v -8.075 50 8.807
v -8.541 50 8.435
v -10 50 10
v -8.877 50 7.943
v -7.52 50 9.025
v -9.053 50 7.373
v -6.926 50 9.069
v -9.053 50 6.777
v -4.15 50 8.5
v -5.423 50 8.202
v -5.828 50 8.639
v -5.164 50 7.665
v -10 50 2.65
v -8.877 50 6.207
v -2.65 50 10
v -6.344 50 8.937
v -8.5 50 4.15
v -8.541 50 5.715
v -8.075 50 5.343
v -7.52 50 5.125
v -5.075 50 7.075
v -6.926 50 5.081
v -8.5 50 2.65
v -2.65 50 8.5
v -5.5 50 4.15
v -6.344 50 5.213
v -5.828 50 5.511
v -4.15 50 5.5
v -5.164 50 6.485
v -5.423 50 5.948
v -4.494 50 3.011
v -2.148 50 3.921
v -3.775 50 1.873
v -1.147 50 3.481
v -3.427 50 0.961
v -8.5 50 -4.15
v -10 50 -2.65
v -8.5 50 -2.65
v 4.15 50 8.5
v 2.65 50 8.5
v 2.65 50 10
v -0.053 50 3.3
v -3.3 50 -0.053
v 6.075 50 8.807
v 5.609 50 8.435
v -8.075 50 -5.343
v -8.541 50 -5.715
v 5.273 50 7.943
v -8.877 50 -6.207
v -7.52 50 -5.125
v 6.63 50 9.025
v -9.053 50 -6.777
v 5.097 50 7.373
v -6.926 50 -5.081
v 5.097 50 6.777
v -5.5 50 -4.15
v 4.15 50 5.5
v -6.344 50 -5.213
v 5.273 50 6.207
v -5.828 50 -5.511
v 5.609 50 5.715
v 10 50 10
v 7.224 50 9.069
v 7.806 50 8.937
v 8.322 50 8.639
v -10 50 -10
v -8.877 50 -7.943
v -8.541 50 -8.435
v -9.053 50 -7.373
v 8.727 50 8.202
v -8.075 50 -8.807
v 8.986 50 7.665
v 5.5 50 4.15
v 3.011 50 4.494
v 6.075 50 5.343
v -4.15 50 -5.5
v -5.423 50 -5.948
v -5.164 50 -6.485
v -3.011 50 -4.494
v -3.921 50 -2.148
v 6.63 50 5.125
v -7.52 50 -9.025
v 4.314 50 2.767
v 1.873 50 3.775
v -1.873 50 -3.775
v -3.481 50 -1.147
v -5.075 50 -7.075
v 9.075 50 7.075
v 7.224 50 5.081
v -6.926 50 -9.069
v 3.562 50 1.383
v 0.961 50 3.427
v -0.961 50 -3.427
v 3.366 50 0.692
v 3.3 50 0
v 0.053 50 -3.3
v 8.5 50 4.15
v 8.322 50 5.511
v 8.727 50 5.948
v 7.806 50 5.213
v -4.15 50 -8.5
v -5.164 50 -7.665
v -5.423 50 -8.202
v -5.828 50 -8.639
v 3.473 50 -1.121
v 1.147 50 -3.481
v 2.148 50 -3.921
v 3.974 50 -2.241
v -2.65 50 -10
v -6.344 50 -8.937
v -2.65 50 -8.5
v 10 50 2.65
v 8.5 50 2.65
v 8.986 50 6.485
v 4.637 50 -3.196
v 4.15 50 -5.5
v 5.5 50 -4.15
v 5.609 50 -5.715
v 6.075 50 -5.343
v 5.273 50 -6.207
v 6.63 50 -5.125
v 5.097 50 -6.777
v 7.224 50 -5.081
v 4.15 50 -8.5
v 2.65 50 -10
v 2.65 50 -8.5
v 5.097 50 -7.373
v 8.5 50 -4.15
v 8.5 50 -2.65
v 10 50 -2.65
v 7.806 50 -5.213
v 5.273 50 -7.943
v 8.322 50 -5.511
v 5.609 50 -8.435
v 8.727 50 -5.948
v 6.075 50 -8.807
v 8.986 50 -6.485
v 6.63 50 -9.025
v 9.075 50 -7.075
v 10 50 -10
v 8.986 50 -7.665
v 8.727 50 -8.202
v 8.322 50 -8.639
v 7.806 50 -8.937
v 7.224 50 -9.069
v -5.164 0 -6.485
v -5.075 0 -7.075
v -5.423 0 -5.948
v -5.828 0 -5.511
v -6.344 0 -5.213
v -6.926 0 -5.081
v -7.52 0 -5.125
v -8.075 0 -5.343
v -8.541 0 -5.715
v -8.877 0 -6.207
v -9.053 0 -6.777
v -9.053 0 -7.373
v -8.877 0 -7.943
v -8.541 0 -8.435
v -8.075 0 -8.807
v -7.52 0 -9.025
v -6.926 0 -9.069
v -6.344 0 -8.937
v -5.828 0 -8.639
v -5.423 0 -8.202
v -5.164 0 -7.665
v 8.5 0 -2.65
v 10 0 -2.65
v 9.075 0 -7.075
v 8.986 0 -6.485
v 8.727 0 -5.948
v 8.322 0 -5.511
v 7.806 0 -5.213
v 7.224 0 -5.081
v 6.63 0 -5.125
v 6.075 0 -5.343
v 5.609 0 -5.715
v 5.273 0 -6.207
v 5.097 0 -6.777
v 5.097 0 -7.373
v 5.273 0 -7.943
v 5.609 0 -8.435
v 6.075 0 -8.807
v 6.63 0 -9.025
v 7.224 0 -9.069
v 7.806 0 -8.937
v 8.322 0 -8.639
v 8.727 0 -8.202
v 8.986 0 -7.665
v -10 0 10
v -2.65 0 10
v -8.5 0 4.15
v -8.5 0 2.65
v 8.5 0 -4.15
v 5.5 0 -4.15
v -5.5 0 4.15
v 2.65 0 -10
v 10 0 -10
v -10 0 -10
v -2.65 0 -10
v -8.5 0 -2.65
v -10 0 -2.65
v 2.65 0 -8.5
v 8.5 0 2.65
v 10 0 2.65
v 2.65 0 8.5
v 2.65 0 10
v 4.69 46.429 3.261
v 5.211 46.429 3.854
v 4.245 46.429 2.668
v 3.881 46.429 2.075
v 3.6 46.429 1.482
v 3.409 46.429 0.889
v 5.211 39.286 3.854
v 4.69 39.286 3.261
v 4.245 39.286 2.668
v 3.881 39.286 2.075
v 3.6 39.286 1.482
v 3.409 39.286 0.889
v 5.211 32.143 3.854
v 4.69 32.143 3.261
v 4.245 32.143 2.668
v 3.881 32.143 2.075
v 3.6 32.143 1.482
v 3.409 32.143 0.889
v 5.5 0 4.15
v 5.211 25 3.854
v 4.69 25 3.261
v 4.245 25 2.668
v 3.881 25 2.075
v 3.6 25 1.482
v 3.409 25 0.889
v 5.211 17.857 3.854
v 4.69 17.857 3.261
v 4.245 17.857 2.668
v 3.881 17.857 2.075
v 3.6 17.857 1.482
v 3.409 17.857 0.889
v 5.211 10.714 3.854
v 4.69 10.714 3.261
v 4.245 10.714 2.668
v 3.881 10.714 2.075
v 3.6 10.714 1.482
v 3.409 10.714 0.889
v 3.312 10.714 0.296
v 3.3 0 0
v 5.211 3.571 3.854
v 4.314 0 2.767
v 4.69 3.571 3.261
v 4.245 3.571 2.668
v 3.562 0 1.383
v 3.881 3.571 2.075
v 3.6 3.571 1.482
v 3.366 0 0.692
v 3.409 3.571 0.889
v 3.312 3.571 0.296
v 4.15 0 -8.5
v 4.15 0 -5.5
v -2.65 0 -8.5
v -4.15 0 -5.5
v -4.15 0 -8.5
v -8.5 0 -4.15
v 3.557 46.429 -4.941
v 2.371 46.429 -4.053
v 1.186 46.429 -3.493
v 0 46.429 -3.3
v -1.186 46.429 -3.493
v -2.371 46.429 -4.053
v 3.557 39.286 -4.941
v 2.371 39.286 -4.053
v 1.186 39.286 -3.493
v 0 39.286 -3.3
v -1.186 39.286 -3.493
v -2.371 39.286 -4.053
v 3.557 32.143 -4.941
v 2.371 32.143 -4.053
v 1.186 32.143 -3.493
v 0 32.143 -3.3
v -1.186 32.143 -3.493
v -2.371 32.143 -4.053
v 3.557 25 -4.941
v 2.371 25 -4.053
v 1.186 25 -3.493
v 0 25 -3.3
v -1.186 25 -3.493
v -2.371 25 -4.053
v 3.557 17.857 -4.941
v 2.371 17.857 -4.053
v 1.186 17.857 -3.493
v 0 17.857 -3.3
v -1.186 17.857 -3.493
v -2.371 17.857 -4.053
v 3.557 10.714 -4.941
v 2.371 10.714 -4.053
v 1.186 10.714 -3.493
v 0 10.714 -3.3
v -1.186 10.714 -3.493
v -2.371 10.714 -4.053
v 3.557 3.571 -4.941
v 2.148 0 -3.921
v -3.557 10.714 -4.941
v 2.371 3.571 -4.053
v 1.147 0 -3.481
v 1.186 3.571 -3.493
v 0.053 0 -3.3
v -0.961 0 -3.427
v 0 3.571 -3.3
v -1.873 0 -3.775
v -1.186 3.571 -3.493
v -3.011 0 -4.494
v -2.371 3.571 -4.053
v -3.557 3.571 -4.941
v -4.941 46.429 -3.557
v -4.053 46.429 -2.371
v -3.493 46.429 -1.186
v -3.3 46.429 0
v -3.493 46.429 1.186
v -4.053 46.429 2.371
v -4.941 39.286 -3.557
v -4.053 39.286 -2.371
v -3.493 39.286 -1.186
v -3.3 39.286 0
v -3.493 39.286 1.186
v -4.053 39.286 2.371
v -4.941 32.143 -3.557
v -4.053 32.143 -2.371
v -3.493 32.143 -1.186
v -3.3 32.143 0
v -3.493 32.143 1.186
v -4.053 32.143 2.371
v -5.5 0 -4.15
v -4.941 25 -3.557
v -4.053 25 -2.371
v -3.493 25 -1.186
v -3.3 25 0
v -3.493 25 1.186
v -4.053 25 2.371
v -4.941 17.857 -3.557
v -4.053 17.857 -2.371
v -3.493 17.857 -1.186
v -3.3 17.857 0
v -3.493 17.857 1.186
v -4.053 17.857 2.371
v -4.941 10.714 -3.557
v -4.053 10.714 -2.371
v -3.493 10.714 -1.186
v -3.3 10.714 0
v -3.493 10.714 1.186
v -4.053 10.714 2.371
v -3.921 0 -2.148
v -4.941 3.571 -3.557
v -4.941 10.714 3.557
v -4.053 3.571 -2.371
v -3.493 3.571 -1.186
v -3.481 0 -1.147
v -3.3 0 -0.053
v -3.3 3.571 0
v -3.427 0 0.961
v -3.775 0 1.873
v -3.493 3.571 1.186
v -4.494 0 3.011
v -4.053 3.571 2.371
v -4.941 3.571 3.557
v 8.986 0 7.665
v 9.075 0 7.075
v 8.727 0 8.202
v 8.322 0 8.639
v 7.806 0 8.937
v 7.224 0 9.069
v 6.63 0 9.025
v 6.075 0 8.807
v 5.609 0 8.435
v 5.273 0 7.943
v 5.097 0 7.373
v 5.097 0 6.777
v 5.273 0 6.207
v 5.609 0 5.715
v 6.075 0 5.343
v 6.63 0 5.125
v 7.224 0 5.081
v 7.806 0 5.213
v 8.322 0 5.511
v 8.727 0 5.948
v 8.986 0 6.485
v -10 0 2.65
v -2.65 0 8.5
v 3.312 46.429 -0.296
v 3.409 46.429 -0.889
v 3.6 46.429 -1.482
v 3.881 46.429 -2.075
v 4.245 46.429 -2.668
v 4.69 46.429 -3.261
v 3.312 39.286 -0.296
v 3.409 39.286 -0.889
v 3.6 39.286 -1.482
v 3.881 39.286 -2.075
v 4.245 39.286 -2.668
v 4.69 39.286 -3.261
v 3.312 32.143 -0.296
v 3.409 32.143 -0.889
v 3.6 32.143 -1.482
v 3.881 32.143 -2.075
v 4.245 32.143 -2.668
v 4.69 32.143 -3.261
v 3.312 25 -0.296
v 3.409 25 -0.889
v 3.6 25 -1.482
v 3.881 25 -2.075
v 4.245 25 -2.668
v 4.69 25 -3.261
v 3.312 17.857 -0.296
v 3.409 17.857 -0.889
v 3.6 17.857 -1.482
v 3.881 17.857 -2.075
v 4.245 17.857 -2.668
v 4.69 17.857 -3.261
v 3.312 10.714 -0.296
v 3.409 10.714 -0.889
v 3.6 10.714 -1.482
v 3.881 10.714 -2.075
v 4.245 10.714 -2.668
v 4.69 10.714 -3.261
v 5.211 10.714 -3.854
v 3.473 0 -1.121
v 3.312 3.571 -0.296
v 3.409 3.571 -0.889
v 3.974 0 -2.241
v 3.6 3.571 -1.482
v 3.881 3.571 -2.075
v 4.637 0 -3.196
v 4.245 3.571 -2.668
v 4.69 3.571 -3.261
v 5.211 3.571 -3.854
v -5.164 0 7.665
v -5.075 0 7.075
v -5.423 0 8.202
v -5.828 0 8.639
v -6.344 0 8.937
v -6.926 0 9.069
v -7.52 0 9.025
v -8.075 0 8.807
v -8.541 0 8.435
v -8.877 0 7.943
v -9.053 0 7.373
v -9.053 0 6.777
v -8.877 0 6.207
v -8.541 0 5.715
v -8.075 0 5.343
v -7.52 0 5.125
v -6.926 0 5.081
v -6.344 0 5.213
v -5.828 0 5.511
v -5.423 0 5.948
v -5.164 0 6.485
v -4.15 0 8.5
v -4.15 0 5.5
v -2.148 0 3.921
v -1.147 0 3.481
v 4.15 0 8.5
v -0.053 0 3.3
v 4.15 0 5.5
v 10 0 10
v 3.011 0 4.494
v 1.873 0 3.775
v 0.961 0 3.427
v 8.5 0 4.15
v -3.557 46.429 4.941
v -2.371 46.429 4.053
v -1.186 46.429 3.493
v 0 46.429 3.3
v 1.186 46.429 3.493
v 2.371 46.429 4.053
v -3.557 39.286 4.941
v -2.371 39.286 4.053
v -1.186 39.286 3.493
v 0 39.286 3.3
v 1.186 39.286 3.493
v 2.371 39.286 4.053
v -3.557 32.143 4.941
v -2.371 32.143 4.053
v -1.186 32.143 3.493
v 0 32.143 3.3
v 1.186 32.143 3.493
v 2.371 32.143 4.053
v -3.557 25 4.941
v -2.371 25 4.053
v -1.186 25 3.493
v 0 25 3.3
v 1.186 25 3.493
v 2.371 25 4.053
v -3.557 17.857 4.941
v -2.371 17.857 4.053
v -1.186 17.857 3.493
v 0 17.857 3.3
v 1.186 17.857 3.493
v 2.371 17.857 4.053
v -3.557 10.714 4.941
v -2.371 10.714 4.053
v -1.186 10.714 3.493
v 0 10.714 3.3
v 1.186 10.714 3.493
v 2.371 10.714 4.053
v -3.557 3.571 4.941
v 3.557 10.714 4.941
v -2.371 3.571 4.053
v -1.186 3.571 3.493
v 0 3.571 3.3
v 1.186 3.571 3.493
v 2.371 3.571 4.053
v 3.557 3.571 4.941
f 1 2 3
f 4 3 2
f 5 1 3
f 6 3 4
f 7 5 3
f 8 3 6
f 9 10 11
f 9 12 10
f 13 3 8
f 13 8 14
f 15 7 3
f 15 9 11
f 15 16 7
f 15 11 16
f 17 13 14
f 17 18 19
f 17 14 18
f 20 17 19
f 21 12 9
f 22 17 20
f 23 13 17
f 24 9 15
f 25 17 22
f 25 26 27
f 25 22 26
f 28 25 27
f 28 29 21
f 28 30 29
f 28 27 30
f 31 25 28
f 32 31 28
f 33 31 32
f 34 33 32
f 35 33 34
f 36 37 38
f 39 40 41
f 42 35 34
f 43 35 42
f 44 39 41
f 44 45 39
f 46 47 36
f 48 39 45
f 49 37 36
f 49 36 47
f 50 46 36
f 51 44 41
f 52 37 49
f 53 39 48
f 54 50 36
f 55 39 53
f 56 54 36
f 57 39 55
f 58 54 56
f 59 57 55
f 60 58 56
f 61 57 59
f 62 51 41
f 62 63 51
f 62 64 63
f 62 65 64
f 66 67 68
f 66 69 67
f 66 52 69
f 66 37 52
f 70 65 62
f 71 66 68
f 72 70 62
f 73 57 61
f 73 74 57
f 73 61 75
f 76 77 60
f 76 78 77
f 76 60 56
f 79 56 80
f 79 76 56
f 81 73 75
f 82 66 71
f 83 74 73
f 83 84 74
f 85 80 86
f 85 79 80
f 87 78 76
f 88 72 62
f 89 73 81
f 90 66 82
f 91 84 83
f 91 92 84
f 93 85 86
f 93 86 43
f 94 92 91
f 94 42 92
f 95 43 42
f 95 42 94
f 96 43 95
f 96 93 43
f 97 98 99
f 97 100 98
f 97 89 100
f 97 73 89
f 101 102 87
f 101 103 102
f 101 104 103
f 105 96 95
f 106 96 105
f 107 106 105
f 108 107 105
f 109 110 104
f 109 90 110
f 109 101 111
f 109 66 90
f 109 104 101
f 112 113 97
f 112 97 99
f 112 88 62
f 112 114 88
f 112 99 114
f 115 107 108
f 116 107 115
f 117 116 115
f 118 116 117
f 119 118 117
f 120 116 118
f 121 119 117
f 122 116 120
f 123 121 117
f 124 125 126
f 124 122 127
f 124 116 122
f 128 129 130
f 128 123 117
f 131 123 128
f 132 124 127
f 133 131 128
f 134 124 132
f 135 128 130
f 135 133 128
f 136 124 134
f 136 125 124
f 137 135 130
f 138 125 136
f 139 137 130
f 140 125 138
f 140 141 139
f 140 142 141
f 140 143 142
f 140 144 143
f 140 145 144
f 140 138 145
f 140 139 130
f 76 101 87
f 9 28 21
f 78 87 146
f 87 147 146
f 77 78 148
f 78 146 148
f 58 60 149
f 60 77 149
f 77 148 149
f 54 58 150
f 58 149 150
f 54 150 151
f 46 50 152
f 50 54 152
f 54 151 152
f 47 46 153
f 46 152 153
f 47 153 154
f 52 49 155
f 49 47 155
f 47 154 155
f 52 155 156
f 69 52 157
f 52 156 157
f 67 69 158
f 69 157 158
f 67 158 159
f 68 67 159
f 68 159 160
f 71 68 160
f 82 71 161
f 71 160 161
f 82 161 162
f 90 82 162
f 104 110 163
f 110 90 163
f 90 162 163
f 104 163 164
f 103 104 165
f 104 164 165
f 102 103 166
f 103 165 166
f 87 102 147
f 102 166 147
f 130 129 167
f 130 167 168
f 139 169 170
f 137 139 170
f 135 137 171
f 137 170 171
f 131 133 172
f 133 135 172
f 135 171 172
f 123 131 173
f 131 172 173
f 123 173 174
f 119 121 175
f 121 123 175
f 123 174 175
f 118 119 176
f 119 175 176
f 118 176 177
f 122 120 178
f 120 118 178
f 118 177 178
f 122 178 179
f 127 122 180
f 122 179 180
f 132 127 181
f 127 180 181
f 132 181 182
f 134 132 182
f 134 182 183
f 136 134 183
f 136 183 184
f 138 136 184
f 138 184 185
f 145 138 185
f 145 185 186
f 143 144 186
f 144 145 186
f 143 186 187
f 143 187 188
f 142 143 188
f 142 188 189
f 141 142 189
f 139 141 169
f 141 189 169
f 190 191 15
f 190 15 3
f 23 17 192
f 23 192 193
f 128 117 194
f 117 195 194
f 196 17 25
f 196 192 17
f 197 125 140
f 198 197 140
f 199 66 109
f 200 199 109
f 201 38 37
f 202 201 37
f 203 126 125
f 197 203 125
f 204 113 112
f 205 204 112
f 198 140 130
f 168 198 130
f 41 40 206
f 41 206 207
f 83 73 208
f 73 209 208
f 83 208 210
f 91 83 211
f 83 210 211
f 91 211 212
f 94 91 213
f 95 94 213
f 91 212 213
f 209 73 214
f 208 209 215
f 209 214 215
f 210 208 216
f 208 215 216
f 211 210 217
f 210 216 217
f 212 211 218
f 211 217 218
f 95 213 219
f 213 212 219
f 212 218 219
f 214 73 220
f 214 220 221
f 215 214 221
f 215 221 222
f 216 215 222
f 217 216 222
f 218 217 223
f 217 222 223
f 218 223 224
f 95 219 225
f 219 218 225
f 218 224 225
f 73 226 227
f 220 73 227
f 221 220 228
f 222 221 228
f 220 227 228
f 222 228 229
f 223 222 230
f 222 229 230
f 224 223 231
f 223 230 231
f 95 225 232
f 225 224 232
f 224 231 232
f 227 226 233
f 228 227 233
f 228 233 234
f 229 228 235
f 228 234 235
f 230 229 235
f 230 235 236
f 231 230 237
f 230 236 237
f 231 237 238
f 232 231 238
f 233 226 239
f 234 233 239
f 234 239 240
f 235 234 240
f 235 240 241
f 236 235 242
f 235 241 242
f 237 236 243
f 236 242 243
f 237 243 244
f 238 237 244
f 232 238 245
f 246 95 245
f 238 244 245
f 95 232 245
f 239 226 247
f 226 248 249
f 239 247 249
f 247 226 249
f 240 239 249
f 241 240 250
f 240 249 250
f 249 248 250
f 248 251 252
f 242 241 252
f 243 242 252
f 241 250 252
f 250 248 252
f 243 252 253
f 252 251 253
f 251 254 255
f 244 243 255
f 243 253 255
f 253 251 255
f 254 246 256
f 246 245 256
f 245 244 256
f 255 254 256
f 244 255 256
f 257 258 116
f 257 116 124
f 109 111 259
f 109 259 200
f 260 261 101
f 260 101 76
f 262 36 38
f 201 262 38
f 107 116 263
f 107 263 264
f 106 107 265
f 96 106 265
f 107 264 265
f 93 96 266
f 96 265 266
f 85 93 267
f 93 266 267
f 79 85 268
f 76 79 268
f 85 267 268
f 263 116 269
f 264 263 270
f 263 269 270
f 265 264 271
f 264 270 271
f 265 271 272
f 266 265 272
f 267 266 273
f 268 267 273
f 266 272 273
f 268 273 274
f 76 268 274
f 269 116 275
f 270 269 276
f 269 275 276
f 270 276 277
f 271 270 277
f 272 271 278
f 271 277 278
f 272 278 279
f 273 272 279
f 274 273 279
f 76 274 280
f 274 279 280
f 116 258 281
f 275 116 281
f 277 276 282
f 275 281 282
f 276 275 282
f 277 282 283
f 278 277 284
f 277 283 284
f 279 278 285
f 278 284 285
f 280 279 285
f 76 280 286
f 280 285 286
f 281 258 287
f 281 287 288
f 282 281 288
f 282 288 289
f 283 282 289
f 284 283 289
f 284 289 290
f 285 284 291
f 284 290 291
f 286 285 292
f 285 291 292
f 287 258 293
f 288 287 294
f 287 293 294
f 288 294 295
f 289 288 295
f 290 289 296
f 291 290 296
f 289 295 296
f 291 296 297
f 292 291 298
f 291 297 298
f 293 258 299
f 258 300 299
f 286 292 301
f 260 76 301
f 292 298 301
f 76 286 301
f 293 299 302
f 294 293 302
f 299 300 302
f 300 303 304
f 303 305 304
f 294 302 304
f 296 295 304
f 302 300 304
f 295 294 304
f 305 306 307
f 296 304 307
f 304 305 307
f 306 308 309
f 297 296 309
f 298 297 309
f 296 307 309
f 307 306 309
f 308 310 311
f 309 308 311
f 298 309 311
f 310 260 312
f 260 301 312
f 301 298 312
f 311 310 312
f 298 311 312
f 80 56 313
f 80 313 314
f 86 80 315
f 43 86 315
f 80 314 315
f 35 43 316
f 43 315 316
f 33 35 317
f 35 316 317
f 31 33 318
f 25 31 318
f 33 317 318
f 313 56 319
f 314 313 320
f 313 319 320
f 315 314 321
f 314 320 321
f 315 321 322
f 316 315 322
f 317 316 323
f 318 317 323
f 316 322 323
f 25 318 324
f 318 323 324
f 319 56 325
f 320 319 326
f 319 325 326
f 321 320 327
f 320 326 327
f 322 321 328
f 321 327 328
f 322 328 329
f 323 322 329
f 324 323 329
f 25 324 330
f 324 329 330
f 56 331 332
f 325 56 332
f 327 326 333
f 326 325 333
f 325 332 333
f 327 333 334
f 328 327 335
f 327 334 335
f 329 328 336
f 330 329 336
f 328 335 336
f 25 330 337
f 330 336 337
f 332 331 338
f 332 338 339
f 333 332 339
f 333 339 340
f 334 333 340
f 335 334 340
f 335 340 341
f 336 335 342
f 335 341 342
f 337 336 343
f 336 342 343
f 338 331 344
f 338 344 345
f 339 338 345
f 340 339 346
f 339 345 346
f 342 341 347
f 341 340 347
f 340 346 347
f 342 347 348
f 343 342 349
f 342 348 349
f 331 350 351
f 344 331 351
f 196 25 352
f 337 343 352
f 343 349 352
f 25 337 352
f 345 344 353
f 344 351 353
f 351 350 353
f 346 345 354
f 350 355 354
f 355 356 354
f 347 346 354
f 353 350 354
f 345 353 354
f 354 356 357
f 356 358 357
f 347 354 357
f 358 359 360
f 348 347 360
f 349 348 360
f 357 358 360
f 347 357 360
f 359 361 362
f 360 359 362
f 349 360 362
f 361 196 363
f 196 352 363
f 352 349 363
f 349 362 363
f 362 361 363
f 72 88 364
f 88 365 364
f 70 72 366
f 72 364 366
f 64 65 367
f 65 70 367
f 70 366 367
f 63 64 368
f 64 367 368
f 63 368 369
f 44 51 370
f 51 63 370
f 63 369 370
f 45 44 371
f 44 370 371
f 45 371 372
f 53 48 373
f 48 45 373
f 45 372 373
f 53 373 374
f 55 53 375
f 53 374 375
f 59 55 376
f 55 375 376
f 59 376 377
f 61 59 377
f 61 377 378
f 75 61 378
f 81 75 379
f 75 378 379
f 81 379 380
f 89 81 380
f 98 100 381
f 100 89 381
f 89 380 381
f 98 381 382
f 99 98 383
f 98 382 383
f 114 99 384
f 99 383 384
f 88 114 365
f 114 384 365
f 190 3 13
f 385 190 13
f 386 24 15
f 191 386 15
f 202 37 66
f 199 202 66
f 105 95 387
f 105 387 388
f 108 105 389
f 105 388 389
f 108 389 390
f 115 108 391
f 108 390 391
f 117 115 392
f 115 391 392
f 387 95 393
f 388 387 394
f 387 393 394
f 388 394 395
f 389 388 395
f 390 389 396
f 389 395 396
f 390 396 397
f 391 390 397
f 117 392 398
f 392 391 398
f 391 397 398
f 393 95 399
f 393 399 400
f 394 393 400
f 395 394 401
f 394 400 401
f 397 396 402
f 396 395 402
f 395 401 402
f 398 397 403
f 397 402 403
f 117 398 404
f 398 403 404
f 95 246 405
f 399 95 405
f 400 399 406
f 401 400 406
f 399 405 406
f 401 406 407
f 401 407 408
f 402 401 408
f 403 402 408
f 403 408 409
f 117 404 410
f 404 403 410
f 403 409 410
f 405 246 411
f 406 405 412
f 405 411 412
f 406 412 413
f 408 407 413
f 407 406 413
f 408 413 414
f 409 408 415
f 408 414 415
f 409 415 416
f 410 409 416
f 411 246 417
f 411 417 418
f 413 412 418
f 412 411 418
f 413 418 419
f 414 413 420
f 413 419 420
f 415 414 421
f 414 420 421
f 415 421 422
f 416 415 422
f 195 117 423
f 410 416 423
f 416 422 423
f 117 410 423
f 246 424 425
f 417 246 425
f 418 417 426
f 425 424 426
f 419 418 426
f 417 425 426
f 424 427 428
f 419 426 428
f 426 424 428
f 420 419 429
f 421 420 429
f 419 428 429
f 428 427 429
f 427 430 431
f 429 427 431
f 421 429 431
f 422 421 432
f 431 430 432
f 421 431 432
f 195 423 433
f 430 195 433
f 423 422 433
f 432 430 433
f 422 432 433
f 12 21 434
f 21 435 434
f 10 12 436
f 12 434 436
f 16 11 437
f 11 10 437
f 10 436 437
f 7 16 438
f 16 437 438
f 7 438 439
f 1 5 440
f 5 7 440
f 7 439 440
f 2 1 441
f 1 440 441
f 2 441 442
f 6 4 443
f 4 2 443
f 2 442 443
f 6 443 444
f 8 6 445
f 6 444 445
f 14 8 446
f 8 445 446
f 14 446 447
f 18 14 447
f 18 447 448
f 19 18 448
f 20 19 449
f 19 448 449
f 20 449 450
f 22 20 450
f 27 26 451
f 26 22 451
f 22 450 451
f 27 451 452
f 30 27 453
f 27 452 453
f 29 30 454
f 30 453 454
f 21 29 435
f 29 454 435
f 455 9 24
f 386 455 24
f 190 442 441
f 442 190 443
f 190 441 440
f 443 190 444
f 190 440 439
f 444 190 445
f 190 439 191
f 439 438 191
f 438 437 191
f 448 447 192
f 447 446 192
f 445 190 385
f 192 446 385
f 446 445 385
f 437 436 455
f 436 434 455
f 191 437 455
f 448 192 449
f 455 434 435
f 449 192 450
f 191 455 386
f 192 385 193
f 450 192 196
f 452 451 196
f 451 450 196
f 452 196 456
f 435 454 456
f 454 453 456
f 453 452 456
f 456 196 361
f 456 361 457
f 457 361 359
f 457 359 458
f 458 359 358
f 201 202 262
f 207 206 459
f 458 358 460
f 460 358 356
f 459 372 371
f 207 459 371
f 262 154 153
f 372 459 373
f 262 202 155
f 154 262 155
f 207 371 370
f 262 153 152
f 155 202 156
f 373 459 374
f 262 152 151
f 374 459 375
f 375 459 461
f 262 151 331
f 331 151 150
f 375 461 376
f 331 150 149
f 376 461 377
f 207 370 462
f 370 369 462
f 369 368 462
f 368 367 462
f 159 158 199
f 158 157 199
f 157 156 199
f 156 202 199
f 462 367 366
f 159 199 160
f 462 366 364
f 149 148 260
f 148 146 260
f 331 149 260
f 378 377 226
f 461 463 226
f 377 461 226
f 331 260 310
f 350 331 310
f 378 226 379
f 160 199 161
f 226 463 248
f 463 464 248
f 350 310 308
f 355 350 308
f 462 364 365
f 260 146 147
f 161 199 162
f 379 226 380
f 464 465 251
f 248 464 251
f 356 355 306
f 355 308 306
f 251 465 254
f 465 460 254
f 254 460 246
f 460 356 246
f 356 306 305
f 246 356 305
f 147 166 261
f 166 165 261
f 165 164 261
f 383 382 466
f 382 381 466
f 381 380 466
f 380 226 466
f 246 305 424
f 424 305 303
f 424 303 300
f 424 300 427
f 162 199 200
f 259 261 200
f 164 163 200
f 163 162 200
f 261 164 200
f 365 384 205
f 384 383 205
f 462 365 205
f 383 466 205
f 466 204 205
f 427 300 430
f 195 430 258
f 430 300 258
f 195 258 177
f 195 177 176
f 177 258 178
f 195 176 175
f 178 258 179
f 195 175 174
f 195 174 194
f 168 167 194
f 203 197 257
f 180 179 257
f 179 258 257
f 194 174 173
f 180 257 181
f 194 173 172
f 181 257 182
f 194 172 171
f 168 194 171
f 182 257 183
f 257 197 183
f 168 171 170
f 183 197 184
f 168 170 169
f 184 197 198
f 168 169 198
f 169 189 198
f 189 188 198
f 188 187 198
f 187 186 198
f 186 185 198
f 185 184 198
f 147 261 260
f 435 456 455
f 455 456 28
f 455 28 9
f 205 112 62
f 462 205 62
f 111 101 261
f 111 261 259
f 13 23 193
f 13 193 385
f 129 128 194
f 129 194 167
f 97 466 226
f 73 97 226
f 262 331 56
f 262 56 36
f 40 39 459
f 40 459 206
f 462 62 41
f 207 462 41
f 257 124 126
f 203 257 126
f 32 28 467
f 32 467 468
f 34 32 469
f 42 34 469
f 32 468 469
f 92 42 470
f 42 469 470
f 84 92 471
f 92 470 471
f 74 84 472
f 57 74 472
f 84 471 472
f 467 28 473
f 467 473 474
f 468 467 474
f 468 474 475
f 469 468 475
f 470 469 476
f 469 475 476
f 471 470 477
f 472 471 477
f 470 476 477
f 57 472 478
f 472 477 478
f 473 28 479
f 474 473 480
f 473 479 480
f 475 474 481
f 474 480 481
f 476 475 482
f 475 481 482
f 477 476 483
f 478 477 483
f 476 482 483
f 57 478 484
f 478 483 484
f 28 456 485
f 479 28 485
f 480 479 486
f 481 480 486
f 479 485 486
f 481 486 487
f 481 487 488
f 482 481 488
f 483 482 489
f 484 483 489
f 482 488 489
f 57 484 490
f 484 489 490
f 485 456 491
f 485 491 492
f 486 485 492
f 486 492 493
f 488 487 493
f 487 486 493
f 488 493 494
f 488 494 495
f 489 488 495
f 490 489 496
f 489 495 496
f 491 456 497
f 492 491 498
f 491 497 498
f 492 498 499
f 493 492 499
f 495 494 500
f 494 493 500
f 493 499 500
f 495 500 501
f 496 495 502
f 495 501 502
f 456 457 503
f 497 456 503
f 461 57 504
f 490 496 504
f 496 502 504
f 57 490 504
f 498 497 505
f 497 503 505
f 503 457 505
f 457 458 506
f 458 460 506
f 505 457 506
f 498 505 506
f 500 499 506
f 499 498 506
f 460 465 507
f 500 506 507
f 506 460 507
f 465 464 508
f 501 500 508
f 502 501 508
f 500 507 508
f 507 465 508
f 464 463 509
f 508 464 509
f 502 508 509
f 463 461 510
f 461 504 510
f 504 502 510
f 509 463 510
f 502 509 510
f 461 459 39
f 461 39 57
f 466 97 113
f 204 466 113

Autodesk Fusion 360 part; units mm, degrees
sketch "스케치1" plane through (0, 0, 0) normal (0, 1, 0) x (1, 0, 0)
  line L0 (10, -10) -> (-10, -10)
  line L1 (-10, -10) -> (-10, 10)
  line L2 (-10, 10) -> (10, 10)
  line L3 (10, 10) -> (10, -10)
  line L4 (10, -10) -> (-10, 10) construction
  line L5 (-10, -10) -> (10, 10) construction
  line L6 (10, 0) -> (10, -4.15)
  line L7 (3.3, 0) -> (3.3, 4.15)
  line L8 (3.3, 4.15) -> (10, 4.15)
  line L9 (10, 4.15) -> (10, -4.15)
  line L10 (10, -4.15) -> (3.3, -4.15)
  line L11 (3.3, -4.15) -> (3.3, 4.15)
  line L12 (10, -4.15) -> (8.5, -4.15)
  line L13 (8.5, -4.15) -> (8.5, -2.65)
  line L14 (8.5, -2.65) -> (10, -2.65)
  line L15 (10, -2.65) -> (10, -4.15)
  line L16 (10, 4.15) -> (8.5, 4.15)
  line L17 (8.5, 4.15) -> (8.5, 2.65)
  line L18 (8.5, 2.65) -> (10, 2.65)
  line L19 (10, 2.65) -> (10, 4.15)
  line L20 (8.5, 4.15) -> (5.5, 4.15)
  line L21 (5.5, 4.15) -> (5.5, -4.15)
  line L22 (5.5, -4.15) -> (8.5, -4.15)
  line L23 (8.5, -4.15) -> (8.5, 4.15)
  spline S0 degree 5 poles (5.5, -4.15) (5.3331, -3.984) (5.014, -3.652) (4.579, -3.154) (4.0878, -2.49) (3.6321, -1.66) (3.3486, -0.83) (3.2516, 0) (3.3486, 0.83) (3.6321, 1.66) (4.0878, 2.49) (4.579, 3.154) (5.014, 3.652) (5.3331, 3.984) (5.5, 4.15) knots 0 0 0 0 0 0 0.1 0.2 0.3 0.4 0.5 0.6 0.7 0.8 0.9 1 1 1 1 1 1
  spline S1 degree 5 poles (4.15, 5.5) (3.984, 5.3331) (3.652, 5.014) (3.154, 4.579) (2.49, 4.0878) (1.66, 3.6321) (0.83, 3.3486) (0, 3.2516) (-0.83, 3.3486) (-1.66, 3.6321) (-2.49, 4.0878) (-3.154, 4.579) (-3.652, 5.014) (-3.984, 5.3331) (-4.15, 5.5) knots 0 0 0 0 0 0 0.1 0.2 0.3 0.4 0.5 0.6 0.7 0.8 0.9 1 1 1 1 1 1
  line L24 (4.15, 5.5) -> (4.15, 8.5)
  line L25 (4.15, 8.5) -> (2.65, 8.5)
  line L26 (2.65, 8.5) -> (2.65, 10)
  line L27 (-4.15, 8.5) -> (-4.15, 5.5)
  line L28 (-4.15, 8.5) -> (-2.65, 8.5)
  line L29 (-2.65, 8.5) -> (-2.65, 10)
  spline S2 degree 5 poles (-5.5, 4.15) (-5.3331, 3.984) (-5.014, 3.652) (-4.579, 3.154) (-4.0878, 2.49) (-3.6321, 1.66) (-3.3486, 0.83) (-3.2516, 0) (-3.3486, -0.83) (-3.6321, -1.66) (-4.0878, -2.49) (-4.579, -3.154) (-5.014, -3.652) (-5.3331, -3.984) (-5.5, -4.15) knots 0 0 0 0 0 0 0.1 0.2 0.3 0.4 0.5 0.6 0.7 0.8 0.9 1 1 1 1 1 1
  line L30 (-5.5, 4.15) -> (-8.5, 4.15)
  line L31 (-8.5, 4.15) -> (-8.5, 2.65)
  line L32 (-8.5, 2.65) -> (-10, 2.65)
  line L33 (-8.5, -4.15) -> (-5.5, -4.15)
  line L34 (-8.5, -4.15) -> (-8.5, -2.65)
  line L35 (-8.5, -2.65) -> (-10, -2.65)
  spline S3 degree 5 poles (-4.15, -5.5) (-3.984, -5.3331) (-3.652, -5.014) (-3.154, -4.579) (-2.49, -4.0878) (-1.66, -3.6321) (-0.83, -3.3486) (0, -3.2516) (0.83, -3.3486) (1.66, -3.6321) (2.49, -4.0878) (3.154, -4.579) (3.652, -5.014) (3.984, -5.3331) (4.15, -5.5) knots 0 0 0 0 0 0 0.1 0.2 0.3 0.4 0.5 0.6 0.7 0.8 0.9 1 1 1 1 1 1
  line L36 (-4.15, -5.5) -> (-4.15, -8.5)
  line L37 (-4.15, -8.5) -> (-2.65, -8.5)
  line L38 (-2.65, -8.5) -> (-2.65, -10)
  line L39 (4.15, -8.5) -> (4.15, -5.5)
  line L40 (4.15, -8.5) -> (2.65, -8.5)
  line L41 (2.65, -8.5) -> (2.65, -10)
  line L42 (-10, -10) -> (-4.15, -10)
  line L43 (-4.15, -10) -> (-4.15, -4.15)
  line L44 (-4.15, -4.15) -> (-10, -4.15)
  line L45 (-10, -4.15) -> (-10, -10)
  circle A0 centre (-7.075, -7.075) radius 2
  circle A1 centre (7.075, -7.075) radius 2
  circle A2 centre (7.075, 7.075) radius 2
  circle A3 centre (-7.075, 7.075) radius 2
  point P0 (0, 3.3)
  point P1 (-3.3, 0)
  point P2 (0, -3.3)
  dimension "d1" = 20
  dimension "d2" = 20
  dimension "d3" = 6.7
  dimension "d4" = 4.15
  dimension "d5" = 4.15
  dimension "d6" = 1.5
  dimension "d7" = 1.5
  dimension "d8" = 1.5
  dimension "d9" = 1.5
  dimension "d10" = 3
  dimension "d12" = 360
  dimension "d13" = 5.85
  dimension "d14" = 4
  dimension "d16" = 360
extrude "돌출1" add sketch "스케치1" along normal blind 50 contours L0 L1 L2 L3 L7 L8 L10 L11 L12 L16 L20 L22 S1 L24 L25 L26 L27 L28 L29 S2 L30 L31 L32 S3 L39 L40 L41 L43 L44 | L3 L6 L9 L10 L12 L13 L14 L15 L23 | L0 L37 L38 L43 | L0 L1 L33 L36 L42 L43 L44 L45 | L10 L11 S0 | L3 L8 L9 L16 L17 L18 L19 L23 | L7 L8 L11 S0 | L1 L34 L35 L44
